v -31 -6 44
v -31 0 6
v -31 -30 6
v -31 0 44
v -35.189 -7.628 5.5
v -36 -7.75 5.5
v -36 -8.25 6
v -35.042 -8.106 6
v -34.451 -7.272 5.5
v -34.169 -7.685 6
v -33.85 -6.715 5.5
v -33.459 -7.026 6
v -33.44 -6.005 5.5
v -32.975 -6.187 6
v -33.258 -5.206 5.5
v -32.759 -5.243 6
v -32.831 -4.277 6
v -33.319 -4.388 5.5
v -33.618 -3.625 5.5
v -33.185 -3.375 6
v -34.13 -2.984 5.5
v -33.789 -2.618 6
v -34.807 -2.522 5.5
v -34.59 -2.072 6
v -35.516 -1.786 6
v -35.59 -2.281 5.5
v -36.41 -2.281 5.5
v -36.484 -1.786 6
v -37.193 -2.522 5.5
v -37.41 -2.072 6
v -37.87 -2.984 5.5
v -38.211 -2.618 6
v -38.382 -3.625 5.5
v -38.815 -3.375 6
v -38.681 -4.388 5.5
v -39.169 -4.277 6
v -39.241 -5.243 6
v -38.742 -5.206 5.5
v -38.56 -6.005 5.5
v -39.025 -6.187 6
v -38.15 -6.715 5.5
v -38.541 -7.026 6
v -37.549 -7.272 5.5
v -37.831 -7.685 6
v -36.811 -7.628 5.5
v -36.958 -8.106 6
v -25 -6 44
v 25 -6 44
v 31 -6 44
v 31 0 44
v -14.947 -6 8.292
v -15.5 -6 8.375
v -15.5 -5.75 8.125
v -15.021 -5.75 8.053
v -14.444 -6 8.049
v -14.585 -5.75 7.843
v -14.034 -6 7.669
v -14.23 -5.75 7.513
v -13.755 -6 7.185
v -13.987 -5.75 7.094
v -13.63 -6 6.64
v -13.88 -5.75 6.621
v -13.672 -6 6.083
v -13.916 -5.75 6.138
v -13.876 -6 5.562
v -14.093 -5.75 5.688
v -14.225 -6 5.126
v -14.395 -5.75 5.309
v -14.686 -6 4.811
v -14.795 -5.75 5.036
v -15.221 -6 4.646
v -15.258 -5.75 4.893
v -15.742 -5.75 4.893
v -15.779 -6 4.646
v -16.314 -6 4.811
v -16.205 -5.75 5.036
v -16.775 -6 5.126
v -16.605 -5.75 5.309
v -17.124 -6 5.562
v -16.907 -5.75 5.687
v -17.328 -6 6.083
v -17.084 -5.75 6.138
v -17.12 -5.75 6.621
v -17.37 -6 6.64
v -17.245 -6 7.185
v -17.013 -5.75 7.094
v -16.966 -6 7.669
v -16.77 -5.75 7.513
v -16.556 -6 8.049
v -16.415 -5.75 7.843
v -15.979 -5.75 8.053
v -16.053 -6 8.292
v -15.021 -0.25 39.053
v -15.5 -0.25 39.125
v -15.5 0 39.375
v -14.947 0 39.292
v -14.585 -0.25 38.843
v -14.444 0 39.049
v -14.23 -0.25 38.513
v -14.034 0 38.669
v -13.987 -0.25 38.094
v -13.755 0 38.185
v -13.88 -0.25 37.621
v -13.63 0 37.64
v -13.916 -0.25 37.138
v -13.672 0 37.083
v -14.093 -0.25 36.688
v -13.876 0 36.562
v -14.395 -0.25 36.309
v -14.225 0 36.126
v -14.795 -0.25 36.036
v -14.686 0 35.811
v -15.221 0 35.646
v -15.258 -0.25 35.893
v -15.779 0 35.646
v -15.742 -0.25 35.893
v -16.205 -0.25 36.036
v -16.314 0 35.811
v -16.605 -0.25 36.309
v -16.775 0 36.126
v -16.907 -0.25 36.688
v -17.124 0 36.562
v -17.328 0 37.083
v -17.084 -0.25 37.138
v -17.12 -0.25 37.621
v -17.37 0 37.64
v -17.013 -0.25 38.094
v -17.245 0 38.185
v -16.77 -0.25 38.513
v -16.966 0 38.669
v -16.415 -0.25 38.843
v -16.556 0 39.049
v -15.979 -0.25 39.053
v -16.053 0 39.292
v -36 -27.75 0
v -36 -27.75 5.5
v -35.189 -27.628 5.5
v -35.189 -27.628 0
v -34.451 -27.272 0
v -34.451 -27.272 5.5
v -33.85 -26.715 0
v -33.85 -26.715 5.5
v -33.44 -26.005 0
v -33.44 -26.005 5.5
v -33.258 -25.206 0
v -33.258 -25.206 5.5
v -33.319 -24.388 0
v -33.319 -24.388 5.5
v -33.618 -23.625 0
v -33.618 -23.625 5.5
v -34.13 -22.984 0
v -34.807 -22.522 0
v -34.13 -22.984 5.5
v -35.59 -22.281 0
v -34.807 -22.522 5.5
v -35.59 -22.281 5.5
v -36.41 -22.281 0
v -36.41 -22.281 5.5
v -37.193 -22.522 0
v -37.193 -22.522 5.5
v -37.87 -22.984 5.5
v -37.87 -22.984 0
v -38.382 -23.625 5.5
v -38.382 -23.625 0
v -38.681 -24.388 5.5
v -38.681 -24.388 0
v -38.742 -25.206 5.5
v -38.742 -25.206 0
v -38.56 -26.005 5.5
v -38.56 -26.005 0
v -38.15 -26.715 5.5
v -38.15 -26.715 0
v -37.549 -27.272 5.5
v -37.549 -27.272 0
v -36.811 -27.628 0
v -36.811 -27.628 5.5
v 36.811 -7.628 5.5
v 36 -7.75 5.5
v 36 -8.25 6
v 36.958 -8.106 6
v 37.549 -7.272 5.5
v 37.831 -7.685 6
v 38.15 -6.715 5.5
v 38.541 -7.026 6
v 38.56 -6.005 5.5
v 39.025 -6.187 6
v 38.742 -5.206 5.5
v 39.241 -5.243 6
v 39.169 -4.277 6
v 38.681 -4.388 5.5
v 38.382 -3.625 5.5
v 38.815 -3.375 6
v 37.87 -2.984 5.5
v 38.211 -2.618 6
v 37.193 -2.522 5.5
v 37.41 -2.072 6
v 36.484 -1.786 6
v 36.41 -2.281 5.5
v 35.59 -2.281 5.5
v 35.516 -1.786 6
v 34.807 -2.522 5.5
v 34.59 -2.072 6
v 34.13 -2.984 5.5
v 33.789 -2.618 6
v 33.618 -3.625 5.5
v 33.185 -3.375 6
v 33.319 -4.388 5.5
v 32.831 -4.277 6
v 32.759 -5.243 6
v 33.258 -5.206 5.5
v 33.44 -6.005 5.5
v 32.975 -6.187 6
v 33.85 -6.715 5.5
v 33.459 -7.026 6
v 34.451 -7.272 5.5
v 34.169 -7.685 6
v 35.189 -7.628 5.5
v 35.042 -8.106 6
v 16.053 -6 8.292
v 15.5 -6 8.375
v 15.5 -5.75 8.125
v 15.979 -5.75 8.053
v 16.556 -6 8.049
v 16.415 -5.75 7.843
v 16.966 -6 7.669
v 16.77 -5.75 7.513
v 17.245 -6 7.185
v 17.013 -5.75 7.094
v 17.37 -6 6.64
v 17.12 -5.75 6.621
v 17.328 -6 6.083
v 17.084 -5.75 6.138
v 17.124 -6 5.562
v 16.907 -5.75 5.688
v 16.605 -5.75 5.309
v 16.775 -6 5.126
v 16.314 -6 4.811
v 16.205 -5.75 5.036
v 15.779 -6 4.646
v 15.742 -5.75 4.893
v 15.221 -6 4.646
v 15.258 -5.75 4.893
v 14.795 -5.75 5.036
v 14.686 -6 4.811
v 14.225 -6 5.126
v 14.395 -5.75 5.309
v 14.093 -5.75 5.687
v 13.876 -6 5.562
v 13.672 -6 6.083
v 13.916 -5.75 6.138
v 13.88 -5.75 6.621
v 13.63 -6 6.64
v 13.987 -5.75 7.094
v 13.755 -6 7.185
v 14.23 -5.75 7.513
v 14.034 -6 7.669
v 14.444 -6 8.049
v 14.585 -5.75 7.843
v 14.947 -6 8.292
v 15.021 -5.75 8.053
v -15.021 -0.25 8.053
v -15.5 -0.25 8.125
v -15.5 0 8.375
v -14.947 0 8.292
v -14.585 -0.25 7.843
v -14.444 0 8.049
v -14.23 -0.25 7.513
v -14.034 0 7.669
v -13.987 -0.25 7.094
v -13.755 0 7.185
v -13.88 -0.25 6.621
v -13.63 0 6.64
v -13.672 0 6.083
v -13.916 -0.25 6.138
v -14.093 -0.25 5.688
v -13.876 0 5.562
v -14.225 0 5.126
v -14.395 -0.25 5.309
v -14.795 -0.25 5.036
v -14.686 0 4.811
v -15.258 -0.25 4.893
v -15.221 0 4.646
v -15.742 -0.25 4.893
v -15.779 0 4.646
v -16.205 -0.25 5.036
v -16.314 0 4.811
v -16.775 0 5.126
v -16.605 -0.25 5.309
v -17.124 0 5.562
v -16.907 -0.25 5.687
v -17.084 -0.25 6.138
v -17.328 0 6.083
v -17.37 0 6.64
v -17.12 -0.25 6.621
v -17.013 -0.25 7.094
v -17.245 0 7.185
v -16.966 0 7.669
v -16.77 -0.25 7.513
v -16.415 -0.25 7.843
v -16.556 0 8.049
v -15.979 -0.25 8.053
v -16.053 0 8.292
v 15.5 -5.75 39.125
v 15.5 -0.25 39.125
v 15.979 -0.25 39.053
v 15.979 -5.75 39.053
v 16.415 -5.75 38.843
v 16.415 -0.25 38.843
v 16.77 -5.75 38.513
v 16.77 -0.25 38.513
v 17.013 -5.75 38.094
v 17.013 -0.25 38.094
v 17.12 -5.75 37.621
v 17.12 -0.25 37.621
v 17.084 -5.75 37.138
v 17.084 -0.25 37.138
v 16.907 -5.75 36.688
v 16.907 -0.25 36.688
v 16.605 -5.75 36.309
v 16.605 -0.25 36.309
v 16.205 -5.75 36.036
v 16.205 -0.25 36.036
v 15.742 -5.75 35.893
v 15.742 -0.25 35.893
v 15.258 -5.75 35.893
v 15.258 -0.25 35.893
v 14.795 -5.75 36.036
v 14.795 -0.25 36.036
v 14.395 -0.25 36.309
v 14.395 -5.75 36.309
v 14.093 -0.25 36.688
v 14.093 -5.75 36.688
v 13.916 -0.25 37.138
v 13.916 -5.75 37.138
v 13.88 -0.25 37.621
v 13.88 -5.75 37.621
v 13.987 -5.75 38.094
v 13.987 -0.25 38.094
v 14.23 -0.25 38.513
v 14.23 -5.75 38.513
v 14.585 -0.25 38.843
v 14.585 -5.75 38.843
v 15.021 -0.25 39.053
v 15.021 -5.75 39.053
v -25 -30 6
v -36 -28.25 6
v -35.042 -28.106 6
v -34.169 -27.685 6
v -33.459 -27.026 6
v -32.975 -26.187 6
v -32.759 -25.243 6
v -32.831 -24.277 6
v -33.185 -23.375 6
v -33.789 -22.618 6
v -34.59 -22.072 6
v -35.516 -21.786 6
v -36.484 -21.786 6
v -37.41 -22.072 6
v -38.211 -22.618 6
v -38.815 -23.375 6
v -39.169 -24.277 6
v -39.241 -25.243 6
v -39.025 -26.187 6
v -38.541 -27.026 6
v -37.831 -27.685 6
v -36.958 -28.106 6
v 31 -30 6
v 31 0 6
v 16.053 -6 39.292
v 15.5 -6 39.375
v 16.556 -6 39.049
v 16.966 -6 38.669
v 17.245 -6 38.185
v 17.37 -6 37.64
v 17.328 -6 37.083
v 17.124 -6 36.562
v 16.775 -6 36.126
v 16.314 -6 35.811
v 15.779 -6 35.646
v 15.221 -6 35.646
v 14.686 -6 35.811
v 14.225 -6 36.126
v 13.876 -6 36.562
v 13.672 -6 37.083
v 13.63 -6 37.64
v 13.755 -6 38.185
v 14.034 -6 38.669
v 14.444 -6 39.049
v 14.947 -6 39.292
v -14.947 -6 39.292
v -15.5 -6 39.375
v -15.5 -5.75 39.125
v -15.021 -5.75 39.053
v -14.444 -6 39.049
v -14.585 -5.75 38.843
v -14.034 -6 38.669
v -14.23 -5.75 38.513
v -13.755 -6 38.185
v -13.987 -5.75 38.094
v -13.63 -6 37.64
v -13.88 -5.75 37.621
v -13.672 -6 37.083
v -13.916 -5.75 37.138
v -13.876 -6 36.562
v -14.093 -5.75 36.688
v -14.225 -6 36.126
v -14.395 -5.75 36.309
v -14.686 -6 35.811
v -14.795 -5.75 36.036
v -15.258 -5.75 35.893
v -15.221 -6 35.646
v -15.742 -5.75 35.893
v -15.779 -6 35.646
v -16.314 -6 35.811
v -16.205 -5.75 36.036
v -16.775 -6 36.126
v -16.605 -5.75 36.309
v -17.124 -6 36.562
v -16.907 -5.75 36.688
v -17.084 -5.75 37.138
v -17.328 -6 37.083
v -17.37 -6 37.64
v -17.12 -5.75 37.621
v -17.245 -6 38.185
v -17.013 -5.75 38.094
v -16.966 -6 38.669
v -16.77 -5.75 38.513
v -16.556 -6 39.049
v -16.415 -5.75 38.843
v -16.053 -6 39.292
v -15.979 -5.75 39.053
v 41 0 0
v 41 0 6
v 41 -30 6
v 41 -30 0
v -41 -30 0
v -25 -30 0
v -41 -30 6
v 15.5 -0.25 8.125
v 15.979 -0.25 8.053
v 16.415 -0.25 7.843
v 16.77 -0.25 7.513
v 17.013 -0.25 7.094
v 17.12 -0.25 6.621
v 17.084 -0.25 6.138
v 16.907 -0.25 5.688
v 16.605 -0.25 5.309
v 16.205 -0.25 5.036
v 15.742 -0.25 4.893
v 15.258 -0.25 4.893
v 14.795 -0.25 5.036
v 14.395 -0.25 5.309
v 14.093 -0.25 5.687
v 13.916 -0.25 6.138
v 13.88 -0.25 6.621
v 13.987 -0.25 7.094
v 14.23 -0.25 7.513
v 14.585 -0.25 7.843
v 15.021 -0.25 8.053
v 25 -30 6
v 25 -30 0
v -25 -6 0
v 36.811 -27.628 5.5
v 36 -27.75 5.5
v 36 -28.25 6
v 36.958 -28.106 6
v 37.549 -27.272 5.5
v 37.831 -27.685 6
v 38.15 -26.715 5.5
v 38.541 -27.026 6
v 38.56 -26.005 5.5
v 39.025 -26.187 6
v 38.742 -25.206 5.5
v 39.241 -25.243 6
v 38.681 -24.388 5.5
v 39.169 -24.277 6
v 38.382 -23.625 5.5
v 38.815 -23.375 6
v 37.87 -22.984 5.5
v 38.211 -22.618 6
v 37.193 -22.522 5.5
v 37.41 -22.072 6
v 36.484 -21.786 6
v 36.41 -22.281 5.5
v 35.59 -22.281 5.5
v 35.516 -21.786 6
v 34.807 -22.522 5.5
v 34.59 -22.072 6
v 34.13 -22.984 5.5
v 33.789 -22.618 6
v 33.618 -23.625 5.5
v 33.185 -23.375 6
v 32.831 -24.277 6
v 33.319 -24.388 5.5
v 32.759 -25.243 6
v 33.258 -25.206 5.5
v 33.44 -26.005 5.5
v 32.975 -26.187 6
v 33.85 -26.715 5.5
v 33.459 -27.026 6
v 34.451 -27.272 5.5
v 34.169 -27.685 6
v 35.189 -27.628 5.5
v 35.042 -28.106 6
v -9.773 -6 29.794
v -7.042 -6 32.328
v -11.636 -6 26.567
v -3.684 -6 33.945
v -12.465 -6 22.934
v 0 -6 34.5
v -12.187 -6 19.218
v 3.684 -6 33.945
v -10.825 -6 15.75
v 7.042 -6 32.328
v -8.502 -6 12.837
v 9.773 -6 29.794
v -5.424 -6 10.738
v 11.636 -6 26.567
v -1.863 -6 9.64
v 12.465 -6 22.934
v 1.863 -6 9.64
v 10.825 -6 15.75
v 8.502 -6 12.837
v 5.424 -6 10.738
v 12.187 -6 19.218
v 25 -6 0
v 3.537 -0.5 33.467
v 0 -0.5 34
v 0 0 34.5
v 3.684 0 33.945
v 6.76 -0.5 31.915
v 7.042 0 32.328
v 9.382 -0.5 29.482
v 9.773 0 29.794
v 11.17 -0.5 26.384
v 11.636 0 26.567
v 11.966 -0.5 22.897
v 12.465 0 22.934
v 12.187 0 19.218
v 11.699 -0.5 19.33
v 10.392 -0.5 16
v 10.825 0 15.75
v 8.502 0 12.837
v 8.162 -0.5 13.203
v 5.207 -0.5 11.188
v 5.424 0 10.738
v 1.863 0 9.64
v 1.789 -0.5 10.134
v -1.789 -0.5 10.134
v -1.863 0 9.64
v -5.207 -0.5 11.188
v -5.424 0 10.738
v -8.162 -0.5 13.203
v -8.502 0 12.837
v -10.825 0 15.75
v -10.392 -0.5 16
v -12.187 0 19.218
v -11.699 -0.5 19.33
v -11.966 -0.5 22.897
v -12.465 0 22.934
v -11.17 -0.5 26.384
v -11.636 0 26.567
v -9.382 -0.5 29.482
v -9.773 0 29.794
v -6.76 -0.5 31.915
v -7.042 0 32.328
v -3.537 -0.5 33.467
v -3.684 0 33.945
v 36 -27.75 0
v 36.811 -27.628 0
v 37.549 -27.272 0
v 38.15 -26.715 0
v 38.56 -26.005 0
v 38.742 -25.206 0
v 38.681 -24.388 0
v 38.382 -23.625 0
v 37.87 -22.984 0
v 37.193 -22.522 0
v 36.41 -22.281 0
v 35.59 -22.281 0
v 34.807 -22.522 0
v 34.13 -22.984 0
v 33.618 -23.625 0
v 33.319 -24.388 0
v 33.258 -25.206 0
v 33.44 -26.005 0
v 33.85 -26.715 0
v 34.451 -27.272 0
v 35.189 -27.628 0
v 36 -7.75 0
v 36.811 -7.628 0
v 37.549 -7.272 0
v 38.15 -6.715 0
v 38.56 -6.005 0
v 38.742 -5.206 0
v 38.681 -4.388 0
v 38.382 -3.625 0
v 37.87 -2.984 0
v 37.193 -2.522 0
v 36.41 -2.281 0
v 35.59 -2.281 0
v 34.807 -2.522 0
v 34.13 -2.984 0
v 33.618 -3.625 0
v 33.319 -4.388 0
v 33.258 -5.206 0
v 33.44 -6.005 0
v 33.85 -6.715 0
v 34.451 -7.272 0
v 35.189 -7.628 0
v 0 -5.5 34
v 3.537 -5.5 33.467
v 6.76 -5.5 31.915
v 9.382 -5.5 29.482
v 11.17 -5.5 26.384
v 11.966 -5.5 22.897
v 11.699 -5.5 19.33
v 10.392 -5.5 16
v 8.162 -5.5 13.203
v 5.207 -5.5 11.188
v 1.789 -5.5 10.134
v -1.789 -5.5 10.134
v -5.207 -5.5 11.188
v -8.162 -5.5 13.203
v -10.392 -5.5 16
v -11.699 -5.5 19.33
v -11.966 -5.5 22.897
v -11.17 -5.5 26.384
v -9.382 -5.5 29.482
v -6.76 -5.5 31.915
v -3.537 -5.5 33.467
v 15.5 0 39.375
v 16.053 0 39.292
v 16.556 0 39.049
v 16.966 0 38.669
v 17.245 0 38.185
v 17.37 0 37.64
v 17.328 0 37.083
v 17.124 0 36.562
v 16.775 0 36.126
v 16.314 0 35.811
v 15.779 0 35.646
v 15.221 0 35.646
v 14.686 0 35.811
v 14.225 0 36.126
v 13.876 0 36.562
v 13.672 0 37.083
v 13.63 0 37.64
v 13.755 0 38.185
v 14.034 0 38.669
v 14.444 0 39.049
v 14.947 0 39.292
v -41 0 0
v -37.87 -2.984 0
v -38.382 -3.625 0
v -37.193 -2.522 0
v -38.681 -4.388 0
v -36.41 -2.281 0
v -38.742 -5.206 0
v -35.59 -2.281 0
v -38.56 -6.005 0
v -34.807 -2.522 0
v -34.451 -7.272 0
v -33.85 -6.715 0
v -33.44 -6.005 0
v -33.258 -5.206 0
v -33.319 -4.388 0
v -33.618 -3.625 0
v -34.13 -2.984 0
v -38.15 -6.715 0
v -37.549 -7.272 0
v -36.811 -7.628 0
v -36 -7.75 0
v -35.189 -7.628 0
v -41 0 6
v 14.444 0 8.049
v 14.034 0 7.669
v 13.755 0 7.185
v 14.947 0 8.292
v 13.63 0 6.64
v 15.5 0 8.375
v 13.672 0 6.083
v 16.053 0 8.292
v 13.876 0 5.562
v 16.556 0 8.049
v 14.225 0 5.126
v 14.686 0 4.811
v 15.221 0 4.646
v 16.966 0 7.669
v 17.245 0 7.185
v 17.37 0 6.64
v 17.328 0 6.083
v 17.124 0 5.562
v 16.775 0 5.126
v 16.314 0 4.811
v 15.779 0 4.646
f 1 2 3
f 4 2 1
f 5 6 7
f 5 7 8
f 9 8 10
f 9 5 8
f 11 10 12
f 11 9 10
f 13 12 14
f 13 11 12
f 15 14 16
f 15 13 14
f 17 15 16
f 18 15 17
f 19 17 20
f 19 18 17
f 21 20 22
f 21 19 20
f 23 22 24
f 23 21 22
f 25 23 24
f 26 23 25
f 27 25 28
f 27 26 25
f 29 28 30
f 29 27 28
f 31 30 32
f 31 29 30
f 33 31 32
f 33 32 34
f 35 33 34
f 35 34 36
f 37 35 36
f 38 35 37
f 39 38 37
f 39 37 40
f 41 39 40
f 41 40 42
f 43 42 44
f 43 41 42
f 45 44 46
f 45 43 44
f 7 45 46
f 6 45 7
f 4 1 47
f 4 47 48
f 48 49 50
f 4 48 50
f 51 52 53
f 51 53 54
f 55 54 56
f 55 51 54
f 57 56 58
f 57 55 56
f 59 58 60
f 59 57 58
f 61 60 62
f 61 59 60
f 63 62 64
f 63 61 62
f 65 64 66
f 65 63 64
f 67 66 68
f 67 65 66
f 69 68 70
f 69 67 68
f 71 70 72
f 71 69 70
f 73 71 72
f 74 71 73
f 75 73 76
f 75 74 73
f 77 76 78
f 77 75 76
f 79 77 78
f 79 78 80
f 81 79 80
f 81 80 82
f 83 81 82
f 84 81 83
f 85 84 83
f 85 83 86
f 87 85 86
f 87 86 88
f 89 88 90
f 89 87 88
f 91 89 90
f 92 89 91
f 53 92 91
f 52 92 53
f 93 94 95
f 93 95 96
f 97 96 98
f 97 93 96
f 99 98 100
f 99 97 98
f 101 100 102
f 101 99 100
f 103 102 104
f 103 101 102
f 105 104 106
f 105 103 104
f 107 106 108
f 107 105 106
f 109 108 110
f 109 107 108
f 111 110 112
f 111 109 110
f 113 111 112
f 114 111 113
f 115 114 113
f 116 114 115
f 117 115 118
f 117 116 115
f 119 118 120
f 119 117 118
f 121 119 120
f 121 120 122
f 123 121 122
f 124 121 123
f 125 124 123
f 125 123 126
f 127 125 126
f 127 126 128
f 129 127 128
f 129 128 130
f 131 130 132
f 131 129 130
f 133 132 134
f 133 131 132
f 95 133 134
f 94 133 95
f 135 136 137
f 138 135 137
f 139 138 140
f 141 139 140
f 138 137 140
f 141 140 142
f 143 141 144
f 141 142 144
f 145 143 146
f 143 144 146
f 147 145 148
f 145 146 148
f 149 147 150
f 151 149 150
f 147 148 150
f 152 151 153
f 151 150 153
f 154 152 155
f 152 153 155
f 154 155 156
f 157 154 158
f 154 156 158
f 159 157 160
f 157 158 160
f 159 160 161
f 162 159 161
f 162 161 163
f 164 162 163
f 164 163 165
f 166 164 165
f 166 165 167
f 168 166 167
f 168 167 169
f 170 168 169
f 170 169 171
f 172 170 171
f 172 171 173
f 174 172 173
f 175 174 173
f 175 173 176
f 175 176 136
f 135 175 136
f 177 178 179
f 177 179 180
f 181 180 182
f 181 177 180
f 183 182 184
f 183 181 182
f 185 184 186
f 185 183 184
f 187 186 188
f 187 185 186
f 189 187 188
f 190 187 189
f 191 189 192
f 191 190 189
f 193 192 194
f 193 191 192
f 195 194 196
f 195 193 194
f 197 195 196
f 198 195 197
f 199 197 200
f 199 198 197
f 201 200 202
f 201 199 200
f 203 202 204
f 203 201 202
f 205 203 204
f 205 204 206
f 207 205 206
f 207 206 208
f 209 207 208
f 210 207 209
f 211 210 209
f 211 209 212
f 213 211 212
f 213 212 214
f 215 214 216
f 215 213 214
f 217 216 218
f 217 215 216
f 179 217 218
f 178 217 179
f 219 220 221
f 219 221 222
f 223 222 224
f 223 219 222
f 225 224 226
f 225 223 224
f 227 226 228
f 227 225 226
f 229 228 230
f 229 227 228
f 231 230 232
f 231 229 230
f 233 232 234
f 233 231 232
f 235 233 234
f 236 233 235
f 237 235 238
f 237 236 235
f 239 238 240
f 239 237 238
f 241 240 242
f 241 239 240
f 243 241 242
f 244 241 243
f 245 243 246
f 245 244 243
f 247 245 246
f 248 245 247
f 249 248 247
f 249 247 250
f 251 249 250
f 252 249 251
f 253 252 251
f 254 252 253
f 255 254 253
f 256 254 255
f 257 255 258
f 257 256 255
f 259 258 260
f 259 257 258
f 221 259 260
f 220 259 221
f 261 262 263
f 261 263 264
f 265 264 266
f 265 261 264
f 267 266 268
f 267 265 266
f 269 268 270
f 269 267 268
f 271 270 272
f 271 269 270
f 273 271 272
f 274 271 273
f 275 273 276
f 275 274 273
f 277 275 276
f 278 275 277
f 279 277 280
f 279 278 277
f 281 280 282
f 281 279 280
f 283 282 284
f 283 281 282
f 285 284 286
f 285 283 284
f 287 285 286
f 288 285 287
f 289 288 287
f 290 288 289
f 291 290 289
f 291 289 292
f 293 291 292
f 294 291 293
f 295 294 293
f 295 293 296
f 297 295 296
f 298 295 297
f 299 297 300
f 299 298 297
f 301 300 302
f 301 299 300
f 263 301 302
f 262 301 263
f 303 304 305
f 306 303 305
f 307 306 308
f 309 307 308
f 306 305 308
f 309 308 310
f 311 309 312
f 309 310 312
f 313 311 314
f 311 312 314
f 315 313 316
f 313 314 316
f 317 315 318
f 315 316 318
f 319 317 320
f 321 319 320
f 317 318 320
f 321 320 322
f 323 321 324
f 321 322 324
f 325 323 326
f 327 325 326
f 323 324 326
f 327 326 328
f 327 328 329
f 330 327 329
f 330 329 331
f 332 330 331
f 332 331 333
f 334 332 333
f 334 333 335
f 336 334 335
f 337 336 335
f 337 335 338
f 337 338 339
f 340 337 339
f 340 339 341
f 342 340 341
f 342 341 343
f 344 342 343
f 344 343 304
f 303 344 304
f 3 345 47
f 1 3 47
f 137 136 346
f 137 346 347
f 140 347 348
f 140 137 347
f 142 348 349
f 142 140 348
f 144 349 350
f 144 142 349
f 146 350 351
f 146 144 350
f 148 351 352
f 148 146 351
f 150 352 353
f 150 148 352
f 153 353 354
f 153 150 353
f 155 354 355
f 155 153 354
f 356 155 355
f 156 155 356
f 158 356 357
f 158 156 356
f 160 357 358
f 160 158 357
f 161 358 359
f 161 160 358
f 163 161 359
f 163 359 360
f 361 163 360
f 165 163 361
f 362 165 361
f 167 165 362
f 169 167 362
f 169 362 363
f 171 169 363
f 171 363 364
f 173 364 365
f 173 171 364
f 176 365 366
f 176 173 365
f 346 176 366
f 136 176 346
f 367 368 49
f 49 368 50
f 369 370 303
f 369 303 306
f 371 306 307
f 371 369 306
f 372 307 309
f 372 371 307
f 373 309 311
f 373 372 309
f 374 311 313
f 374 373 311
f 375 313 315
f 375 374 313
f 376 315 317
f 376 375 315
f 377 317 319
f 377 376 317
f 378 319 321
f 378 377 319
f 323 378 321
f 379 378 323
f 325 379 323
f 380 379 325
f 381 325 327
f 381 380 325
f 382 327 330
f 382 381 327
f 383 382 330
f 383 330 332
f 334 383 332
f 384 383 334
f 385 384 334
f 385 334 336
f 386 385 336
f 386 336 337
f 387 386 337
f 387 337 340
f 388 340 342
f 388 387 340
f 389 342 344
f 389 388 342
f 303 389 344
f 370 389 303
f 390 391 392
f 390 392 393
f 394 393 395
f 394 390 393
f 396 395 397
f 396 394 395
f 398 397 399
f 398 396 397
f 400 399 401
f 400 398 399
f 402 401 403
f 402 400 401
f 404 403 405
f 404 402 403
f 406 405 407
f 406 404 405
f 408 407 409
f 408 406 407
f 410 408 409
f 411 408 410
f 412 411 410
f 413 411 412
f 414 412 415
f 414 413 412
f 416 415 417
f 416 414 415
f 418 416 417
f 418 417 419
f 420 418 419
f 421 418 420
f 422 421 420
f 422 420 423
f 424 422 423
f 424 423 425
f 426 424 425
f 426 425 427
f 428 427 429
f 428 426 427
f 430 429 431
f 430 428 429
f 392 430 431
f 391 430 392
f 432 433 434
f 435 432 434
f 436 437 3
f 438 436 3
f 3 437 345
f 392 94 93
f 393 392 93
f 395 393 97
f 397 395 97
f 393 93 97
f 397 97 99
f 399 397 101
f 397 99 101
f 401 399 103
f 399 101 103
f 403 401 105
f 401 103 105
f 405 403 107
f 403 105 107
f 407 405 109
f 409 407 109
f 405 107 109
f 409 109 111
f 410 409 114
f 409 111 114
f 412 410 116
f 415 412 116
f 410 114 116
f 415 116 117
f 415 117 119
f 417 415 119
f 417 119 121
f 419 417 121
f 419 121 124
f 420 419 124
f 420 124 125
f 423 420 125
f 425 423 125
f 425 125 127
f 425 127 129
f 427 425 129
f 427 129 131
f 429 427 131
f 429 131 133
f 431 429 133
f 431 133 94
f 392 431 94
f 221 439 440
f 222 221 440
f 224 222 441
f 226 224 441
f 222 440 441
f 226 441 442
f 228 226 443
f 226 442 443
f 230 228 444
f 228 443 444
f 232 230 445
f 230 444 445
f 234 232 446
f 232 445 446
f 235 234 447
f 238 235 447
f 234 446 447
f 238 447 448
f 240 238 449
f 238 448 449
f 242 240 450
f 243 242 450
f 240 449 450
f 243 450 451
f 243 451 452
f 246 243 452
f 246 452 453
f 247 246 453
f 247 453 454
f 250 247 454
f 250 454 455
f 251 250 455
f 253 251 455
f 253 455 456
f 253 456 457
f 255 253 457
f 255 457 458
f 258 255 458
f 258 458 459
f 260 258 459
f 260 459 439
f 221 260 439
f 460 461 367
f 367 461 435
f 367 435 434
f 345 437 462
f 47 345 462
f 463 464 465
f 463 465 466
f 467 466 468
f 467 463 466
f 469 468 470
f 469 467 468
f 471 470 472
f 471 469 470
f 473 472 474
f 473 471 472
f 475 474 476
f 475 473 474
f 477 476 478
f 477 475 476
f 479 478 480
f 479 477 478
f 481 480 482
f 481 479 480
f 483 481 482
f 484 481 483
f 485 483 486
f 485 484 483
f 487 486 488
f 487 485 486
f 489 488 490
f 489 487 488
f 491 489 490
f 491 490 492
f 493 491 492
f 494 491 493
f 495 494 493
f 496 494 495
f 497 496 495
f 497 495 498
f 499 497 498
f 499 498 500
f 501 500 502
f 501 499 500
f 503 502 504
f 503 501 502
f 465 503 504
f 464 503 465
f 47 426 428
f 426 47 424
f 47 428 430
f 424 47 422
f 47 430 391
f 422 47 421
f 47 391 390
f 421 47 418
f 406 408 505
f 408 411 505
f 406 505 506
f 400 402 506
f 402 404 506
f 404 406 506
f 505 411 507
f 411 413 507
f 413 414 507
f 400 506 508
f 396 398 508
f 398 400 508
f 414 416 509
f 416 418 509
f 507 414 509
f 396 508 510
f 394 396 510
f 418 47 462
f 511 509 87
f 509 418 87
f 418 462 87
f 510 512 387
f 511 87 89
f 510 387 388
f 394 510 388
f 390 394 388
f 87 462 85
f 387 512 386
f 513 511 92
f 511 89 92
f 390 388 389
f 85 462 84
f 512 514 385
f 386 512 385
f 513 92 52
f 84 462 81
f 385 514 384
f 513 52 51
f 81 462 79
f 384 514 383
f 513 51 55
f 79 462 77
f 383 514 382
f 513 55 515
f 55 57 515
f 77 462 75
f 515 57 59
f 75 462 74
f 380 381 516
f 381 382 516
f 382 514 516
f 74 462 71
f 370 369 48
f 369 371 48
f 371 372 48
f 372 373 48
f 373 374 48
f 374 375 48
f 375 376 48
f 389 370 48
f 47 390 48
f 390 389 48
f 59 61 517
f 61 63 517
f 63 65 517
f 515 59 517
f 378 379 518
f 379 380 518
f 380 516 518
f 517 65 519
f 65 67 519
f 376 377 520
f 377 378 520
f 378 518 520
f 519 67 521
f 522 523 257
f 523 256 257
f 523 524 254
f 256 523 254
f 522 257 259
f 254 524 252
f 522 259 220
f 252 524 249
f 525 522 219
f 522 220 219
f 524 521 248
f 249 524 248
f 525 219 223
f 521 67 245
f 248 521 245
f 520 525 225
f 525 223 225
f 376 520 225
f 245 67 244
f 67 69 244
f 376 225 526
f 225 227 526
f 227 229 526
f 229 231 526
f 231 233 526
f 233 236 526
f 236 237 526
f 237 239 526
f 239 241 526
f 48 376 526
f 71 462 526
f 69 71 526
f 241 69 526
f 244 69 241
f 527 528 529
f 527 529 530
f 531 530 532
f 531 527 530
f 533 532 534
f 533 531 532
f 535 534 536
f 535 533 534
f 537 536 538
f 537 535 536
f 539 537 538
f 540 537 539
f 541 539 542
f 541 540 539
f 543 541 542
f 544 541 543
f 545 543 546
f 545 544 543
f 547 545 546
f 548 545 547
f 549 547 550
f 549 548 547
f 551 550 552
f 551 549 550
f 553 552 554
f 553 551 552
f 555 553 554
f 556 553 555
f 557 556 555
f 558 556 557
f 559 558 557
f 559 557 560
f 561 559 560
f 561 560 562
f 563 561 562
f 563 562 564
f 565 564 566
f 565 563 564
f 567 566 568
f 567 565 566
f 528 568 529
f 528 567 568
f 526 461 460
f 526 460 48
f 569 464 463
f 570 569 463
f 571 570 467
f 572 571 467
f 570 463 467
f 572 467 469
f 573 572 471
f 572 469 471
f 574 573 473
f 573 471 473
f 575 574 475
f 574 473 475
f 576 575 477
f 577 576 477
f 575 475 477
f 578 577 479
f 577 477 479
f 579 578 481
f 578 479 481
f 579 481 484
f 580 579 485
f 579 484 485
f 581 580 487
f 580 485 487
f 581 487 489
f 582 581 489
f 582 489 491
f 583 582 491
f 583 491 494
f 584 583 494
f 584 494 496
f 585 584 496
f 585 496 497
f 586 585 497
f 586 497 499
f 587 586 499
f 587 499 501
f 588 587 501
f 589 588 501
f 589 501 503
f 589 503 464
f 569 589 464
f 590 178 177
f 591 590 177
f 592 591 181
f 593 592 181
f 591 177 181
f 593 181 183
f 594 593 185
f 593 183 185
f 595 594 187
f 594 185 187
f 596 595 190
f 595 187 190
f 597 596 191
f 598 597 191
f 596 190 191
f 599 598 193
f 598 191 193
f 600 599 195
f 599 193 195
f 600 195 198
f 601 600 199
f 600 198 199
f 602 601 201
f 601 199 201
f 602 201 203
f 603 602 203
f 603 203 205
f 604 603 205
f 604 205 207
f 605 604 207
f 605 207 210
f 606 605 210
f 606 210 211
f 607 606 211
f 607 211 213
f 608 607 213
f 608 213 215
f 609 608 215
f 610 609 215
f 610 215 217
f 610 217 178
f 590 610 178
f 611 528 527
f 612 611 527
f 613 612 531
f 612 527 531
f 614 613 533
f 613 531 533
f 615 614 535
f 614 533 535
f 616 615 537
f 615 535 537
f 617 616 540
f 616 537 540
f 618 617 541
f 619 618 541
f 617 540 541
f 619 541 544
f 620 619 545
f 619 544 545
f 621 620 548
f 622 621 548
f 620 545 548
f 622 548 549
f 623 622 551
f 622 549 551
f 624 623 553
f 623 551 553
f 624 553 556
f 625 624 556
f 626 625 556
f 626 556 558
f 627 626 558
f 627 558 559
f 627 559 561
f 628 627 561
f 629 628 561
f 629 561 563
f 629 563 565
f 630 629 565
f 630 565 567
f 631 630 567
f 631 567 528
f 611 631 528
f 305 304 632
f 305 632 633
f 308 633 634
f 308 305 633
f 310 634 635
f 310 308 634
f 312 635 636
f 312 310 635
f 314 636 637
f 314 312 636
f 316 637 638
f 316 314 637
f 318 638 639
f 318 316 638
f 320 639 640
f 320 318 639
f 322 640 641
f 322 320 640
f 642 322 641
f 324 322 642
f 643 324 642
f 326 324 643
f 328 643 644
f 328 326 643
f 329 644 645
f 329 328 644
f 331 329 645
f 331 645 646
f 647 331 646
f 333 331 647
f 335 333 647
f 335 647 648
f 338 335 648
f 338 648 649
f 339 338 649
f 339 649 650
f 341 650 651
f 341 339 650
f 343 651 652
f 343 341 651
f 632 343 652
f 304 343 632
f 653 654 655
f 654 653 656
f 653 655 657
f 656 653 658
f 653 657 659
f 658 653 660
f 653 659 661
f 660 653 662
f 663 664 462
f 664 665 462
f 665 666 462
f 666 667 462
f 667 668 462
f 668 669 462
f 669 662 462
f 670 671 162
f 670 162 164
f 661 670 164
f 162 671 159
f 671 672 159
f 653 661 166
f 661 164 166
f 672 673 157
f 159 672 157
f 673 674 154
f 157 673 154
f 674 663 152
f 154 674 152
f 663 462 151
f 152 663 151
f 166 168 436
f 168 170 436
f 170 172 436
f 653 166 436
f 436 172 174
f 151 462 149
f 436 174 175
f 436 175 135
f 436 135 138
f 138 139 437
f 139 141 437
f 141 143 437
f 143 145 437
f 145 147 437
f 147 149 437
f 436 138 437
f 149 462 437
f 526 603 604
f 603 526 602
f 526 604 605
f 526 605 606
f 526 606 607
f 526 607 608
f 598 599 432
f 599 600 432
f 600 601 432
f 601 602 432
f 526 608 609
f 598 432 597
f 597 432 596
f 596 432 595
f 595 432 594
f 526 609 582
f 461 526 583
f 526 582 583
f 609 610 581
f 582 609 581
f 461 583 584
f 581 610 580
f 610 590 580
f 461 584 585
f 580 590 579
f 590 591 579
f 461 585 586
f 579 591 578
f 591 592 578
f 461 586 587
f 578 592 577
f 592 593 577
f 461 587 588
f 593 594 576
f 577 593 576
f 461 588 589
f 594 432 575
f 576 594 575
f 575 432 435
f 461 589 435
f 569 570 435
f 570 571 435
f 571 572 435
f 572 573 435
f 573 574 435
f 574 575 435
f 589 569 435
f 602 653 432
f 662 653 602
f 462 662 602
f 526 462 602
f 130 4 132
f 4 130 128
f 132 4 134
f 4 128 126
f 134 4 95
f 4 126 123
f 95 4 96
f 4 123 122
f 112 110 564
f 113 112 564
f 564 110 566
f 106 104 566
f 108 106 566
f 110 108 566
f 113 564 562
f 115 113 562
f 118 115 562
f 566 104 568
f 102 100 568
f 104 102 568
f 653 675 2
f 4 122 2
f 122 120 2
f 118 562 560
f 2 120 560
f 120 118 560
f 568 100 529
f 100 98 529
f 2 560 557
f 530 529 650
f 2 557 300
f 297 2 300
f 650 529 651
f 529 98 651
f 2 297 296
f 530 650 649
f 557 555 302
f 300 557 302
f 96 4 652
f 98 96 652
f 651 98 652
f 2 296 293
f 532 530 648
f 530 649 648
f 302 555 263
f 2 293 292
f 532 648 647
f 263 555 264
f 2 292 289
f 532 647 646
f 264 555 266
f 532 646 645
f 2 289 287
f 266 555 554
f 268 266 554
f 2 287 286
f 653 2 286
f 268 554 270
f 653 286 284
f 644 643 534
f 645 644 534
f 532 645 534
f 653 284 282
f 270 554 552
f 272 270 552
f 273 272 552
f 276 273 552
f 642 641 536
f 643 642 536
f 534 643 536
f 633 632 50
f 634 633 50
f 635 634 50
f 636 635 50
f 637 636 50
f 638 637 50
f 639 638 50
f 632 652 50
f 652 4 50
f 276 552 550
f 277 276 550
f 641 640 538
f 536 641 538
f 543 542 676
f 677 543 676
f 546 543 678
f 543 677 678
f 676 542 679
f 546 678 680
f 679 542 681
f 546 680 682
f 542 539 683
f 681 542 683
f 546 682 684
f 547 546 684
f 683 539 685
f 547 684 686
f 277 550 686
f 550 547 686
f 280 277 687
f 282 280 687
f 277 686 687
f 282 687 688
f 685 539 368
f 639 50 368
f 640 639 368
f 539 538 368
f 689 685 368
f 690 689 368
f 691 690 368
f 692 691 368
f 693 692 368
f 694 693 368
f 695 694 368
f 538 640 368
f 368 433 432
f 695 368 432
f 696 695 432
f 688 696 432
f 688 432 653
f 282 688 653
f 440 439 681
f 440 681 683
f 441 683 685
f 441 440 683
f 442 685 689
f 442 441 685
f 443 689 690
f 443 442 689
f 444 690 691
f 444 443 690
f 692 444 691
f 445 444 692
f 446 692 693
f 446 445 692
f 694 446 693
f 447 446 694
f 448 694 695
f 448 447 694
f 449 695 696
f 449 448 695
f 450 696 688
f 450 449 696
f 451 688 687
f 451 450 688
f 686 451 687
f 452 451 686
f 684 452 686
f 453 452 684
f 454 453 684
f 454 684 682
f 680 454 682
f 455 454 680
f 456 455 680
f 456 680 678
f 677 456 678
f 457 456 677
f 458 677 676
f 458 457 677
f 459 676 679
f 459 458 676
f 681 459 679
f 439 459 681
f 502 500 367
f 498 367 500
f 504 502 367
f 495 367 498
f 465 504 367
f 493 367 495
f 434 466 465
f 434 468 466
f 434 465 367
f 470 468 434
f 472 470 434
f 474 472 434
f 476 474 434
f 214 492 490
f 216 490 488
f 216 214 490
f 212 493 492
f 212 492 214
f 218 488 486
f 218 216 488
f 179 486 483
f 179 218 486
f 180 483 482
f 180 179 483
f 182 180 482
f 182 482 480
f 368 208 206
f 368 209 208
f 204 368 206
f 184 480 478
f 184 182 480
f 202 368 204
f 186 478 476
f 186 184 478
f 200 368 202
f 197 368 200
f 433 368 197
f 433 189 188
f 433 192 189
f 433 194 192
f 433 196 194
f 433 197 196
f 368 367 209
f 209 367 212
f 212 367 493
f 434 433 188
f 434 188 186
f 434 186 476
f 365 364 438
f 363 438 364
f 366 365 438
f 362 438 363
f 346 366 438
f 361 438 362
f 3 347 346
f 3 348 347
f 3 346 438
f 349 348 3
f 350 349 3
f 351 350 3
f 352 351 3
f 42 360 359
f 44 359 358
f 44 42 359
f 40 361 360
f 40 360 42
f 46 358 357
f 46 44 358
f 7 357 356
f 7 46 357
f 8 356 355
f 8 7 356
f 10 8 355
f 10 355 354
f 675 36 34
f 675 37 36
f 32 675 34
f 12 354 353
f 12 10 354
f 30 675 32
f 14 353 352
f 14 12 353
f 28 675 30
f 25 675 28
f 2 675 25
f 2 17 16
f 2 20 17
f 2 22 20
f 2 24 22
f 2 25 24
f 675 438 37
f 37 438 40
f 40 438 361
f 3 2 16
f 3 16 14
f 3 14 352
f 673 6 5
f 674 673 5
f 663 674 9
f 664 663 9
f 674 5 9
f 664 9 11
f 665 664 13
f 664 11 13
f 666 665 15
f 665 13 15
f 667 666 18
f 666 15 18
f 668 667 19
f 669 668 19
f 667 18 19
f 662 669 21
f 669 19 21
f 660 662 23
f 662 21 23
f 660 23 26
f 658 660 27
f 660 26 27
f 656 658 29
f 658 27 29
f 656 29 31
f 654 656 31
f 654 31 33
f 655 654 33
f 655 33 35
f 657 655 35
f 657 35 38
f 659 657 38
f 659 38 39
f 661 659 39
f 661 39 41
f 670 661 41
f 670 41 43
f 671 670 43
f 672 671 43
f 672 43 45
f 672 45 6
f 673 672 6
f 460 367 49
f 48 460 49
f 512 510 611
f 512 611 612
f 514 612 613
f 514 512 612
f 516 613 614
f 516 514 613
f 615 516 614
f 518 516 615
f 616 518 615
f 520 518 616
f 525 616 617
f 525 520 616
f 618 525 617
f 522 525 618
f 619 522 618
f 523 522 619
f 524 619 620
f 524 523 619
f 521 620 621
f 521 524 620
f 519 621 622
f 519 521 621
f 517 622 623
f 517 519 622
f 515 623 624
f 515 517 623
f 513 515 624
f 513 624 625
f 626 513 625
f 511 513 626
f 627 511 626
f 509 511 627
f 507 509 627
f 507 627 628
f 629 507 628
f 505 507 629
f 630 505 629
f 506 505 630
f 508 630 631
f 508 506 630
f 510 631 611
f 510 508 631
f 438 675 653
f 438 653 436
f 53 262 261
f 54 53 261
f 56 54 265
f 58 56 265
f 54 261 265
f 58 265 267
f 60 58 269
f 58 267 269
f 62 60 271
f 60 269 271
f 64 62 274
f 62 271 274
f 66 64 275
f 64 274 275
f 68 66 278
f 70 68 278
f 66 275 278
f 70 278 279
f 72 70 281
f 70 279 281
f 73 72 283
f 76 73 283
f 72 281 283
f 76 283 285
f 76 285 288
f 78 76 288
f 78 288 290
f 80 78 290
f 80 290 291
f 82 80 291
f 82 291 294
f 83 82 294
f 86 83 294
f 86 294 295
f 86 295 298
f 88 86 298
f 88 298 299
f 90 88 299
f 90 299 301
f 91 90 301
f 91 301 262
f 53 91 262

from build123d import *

# Parameters (mm, degrees)
PAD_DEPTH       = 41
SKETCH001_W     = 25
SKETCH001_H     = 50
POCKET_DEPTH    = 44.001
SKETCH002_W     = 45
SKETCH002_H     = 10
POCKET001_DEPTH = 30.001
SKETCH003_R     = 12
SKETCH003_R_2   = 1.625
POCKET002_DEPTH = 30.001
SKETCH004_R     = 2.75
POCKET003_DEPTH = 6.001
CHAMFER_SIZE    = 0.5
CHAMFER001_SIZE = 0.5
CHAMFER002_SIZE = 0.25


with BuildPart() as part:
    # Sketch → Pad (new body, symmetric)
    with BuildSketch(Plane.YZ):
        Polygon((0, 44), (0, 0), (-30, 0), (-30, 6), (-6, 44), align=None)
    extrude(amount=PAD_DEPTH, both=True)

    # Sketch001 → Pocket (cut, through all)
    with BuildSketch(Plane.YX):
        with Locations((-18.5, 0)):
            Rectangle(SKETCH001_W, SKETCH001_H)
    extrude(amount=-POCKET_DEPTH, mode=Mode.SUBTRACT)

    # Sketch002 → Pocket001 (cut, through all)
    with BuildSketch(Plane.ZX):
        with Locations((28.5, 36)):
            Rectangle(SKETCH002_W, SKETCH002_H)
        with Locations((28.5, -36)):
            Rectangle(SKETCH002_W, SKETCH002_H)
    extrude(amount=-POCKET001_DEPTH, mode=Mode.SUBTRACT)

    # Sketch003 → Pocket002 (cut, through all)
    with BuildSketch(Plane.ZX):
        with Locations((22, 0)):
            Circle(SKETCH003_R)
        with Locations((6.5, 15.5)):
            Circle(SKETCH003_R_2)
        with Locations((37.5, 15.5)):
            Circle(SKETCH003_R_2)
        with Locations((6.5, -15.5)):
            Circle(SKETCH003_R_2)
        with Locations((37.5, -15.5)):
            Circle(SKETCH003_R_2)
    extrude(amount=-POCKET002_DEPTH, mode=Mode.SUBTRACT)

    # Sketch004 → Pocket003 (cut, through all)
    with BuildSketch(Plane(origin=(0, 0, 6), x_dir=(0, -1, 0), z_dir=(0, 0, 1))):
        with Locations((5, 36)):
            Circle(SKETCH004_R)
        with Locations((25, 36)):
            Circle(SKETCH004_R)
        with Locations((5, -36)):
            Circle(SKETCH004_R)
        with Locations((25, -36)):
            Circle(SKETCH004_R)
    extrude(amount=-POCKET003_DEPTH, mode=Mode.SUBTRACT)

    # Chamfer
    chamfer_edges = [part.edges().sort_by_distance(p)[0] for p in [
        (36, -22.25, 6),
        (36, -2.25, 6),
        (-36, -22.25, 6),
        (-36, -2.25, 6),
    ]]
    chamfer(chamfer_edges, length=CHAMFER_SIZE)

    # Chamfer001
    chamfer001_edges = [part.edges().sort_by_distance(p)[0] for p in [
        (0, -6, 10),
        (0, 0, 10),
    ]]
    chamfer(chamfer001_edges, length=CHAMFER001_SIZE)

    # Chamfer002
    chamfer002_edges = [part.edges().sort_by_distance(p)[0] for p in [
        (15.5, 0, 35.875),
        (15.5, 0, 4.875),
        (-15.5, 0, 35.875),
        (-15.5, 0, 4.875),
        (15.5, -6, 35.875),
        (15.5, -6, 4.875),
        (-15.5, -6, 4.875),
        (-15.5, -6, 35.875),
    ]]
    chamfer(chamfer002_edges, length=CHAMFER002_SIZE)


solid = part.part
